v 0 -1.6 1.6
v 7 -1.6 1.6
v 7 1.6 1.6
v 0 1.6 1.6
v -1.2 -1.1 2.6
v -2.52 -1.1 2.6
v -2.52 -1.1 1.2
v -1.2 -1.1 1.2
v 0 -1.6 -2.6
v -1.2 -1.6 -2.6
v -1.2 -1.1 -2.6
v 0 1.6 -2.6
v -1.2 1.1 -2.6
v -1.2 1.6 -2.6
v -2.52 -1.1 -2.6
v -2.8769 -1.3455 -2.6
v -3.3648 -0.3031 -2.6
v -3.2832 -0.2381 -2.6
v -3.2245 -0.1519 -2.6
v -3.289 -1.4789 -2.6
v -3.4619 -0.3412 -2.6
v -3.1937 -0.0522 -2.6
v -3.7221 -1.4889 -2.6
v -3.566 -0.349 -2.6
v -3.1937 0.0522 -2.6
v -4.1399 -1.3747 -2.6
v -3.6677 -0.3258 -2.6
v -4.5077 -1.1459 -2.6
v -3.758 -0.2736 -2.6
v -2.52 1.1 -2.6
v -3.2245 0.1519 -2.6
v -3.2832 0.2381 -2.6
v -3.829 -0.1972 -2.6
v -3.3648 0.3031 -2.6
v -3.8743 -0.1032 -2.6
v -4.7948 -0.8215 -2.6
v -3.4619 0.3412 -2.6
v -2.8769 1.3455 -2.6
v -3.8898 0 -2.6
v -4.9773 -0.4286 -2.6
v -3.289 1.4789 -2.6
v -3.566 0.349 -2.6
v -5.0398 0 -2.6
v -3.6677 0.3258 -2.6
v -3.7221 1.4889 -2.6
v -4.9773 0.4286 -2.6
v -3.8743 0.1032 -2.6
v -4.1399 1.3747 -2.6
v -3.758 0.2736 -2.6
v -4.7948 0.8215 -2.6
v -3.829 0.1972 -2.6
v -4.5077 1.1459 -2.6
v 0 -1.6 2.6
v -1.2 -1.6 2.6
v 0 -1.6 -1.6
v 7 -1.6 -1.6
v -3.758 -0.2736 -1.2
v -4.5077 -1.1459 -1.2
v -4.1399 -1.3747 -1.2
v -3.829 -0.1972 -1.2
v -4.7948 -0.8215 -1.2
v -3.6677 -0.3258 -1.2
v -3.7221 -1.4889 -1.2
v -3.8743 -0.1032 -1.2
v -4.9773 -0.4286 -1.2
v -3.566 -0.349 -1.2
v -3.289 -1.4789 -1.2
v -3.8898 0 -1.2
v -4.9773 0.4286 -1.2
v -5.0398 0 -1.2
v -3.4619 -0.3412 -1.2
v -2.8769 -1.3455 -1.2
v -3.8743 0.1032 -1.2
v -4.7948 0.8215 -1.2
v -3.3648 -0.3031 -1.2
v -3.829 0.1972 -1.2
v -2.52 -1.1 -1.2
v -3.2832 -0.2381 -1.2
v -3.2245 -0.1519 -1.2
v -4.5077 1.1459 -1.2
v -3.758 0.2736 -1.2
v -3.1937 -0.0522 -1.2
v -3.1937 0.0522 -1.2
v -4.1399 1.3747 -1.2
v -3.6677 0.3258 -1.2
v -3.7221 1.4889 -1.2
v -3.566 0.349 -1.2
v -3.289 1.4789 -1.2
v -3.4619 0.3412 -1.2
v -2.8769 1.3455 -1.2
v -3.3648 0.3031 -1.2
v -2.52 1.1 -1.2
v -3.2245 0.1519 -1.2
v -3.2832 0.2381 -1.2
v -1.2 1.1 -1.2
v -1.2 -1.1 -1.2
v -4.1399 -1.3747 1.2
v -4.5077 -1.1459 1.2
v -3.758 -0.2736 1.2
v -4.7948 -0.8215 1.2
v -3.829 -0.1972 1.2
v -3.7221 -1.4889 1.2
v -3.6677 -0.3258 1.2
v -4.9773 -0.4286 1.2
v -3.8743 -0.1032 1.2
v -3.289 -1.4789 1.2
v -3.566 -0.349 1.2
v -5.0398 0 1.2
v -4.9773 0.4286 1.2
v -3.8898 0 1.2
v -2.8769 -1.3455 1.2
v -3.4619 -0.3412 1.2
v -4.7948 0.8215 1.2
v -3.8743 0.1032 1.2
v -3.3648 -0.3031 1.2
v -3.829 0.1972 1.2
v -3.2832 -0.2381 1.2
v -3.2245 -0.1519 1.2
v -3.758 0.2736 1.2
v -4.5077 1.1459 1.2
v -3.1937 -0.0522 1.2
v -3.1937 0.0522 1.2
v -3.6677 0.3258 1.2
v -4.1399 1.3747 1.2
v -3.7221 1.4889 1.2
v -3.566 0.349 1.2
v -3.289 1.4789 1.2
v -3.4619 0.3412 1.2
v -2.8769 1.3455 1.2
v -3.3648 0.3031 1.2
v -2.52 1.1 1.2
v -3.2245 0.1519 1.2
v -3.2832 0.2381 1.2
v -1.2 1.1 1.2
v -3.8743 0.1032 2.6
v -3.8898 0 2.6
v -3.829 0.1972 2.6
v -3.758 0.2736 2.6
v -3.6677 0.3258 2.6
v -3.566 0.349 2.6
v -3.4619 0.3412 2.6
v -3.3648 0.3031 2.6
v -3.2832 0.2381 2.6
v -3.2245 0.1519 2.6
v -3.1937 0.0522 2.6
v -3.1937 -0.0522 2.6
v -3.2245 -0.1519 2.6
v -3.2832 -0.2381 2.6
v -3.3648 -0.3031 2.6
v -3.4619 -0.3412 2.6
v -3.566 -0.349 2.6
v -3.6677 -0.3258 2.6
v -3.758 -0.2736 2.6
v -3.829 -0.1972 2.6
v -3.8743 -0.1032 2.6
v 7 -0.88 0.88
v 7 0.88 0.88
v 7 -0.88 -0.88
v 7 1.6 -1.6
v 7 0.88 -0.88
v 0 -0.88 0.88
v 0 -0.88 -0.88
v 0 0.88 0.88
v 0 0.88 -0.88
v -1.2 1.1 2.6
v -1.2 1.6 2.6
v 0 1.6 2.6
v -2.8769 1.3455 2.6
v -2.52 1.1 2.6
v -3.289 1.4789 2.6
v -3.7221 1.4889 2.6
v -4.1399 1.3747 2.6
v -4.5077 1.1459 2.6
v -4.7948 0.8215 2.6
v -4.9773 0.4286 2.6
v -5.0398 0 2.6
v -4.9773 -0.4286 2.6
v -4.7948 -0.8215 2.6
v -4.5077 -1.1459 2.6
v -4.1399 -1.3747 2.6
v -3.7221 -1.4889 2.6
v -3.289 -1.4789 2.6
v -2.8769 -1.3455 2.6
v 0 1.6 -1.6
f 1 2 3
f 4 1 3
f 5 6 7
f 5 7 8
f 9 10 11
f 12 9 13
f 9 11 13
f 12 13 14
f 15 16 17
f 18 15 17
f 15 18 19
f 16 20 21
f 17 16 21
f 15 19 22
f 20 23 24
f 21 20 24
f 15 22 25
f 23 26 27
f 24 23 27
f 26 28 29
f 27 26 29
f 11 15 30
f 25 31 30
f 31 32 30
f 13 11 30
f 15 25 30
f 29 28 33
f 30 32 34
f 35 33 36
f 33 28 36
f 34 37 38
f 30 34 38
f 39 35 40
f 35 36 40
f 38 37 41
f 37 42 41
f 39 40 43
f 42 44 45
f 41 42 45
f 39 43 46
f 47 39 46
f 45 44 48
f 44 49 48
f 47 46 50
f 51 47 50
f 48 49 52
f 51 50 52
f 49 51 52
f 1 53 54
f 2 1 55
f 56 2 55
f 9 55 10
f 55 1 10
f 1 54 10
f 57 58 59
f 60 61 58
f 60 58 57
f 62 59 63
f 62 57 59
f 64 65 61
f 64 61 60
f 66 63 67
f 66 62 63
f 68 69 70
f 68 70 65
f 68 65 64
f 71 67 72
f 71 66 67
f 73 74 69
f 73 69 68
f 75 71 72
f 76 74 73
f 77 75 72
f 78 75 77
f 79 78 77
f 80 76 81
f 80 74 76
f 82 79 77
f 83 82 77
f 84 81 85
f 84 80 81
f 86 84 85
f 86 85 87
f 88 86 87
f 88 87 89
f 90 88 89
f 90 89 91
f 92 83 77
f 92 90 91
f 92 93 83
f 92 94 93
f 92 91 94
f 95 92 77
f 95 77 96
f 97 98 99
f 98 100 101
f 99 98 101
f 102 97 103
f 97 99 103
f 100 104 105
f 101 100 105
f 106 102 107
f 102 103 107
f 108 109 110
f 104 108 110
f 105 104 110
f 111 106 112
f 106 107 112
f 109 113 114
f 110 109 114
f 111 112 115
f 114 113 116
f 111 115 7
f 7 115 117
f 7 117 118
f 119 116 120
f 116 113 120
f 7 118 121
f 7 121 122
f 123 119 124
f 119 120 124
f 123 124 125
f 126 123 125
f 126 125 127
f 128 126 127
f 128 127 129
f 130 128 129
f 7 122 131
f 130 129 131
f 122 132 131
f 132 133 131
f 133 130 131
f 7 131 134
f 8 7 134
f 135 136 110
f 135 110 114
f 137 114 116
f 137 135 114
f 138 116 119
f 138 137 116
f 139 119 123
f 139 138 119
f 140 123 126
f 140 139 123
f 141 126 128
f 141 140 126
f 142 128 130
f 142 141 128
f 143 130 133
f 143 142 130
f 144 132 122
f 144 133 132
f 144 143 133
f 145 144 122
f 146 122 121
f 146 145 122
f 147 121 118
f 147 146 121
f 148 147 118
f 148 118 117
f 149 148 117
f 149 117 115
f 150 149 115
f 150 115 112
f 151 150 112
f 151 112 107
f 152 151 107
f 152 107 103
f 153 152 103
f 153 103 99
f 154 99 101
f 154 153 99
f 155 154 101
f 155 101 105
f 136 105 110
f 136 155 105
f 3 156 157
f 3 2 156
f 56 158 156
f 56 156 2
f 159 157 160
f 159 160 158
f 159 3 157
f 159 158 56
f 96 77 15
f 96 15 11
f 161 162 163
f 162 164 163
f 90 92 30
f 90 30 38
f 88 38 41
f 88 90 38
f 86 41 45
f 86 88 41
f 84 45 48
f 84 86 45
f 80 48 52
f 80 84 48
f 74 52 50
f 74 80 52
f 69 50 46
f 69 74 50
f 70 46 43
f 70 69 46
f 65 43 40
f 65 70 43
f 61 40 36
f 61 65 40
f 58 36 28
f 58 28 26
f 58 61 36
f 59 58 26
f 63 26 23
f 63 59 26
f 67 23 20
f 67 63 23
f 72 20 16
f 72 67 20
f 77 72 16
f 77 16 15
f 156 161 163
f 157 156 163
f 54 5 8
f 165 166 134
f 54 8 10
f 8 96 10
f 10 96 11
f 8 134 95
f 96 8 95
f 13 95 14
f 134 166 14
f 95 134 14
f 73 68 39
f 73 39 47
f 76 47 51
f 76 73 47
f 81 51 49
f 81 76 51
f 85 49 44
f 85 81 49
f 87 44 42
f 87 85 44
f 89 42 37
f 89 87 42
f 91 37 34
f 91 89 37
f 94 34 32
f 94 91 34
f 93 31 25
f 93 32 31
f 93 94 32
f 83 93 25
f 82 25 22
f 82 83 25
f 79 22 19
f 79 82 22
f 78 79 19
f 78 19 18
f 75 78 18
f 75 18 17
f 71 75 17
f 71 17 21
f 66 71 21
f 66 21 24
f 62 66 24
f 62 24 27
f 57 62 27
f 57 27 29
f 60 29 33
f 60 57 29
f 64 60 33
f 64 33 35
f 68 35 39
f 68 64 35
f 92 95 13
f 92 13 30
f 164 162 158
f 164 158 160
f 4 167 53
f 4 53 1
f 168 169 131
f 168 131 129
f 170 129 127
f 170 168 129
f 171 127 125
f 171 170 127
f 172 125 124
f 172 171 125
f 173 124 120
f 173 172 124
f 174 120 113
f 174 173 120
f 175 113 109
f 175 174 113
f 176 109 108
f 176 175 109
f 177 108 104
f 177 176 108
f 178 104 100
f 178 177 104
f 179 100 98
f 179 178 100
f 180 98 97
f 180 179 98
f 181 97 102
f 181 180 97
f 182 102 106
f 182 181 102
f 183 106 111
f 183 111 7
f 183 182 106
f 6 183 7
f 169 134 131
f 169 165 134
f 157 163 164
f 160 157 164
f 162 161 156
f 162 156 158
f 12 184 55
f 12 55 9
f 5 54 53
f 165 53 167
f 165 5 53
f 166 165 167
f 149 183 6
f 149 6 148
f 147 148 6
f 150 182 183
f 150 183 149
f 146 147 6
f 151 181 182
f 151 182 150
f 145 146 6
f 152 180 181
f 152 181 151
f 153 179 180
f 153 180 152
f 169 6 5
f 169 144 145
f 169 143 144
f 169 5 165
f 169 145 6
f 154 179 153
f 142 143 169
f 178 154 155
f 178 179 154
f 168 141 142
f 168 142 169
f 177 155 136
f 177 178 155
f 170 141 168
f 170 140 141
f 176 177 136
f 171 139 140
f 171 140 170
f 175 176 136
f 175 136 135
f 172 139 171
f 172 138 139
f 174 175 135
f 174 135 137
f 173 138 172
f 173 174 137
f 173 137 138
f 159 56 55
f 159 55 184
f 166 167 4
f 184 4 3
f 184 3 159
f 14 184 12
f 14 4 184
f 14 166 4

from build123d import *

# Parameters (mm, degrees)
SKETCH_1_W               = 3.2
SKETCH_1_H               = 3.2
SKETCH_1_W_2             = 1.76
SKETCH_1_H_2             = 1.76
EXTRUDE_1_DEPTH          = 7
SKETCH_2_W               = 3.2
SKETCH_2_H               = 3.2
EXTRUDE_2_DEPTH          = 1.2
EXTRUDE_3_DEPTH          = 2.6
CUT_EXTRUDE_1_DEPTH      = 1.2
SKETCH_5_W               = 5.2
SKETCH_5_H               = 3.2
EXTRUDE_4_DEPTH          = 1.2
CUT_EXTRUDE_2_DEPTH      = 9.124038405
CUT_EXTRUDE_2_DEPTH_BACK = 9.124038405
SKETCH_6_R               = 0.35


with BuildPart() as part:
    # 草图1 → 凸台-拉伸1 (new body)
    with BuildSketch(Plane(origin=(0, 0, 0), x_dir=(0, 0, -1), z_dir=(1, 0, 0))):
        Rectangle(SKETCH_1_W, SKETCH_1_H)
        Rectangle(SKETCH_1_W_2, SKETCH_1_H_2, mode=Mode.SUBTRACT)
    extrude(amount=EXTRUDE_1_DEPTH)

    # 草图2 → 凸台-拉伸2 (add)
    with BuildSketch(Plane.ZY):
        Rectangle(SKETCH_2_W, SKETCH_2_H)
    extrude(amount=EXTRUDE_2_DEPTH)

    # 草图3 → 凸台-拉伸3 (add, symmetric)
    with BuildSketch(Plane.XY):
        with BuildLine():
            Line((-1.2, -1.1), (-1.2, 1.1))
            Line((-1.2, 1.1), (-2.52, 1.1))
            ThreePointArc((-2.52, 1.1), (-2.165084685, 0.600122548), (-2.039803903, 0))
            ThreePointArc((-2.039803903, 0), (-2.165084685, -0.600122548), (-2.52, -1.1))
            Line((-2.52, -1.1), (-1.2, -1.1))
        make_face()
        with BuildLine():
            ThreePointArc((-2.039803903, 0), (-2.165084685, 0.600122548), (-2.52, 1.1))
            Line((-2.52, 1.1), (-2.52, -1.1))
            ThreePointArc((-2.52, -1.1), (-2.165084685, -0.600122548), (-2.039803903, 0))
        make_face()
        with BuildLine():
            Line((-2.52, -1.1), (-2.52, 1.1))
            ThreePointArc((-2.52, 1.1), (-5.039803903, 0), (-2.52, -1.1))
        make_face()
        with BuildLine():
            ThreePointArc((-2.039803903, 0), (-2.165084685, 0.600122548), (-2.52, 1.1))
            Line((-2.52, 1.1), (-2.52, -1.1))
            ThreePointArc((-2.52, -1.1), (-2.165084685, -0.600122548), (-2.039803903, 0))
        make_face()
        with BuildLine():
            Line((-2.52, -1.1), (-2.52, 1.1))
            ThreePointArc((-2.52, 1.1), (-5.039803903, 0), (-2.52, -1.1))
        make_face()
    extrude(amount=EXTRUDE_3_DEPTH, both=True)

    # 草图4 → 切除-拉伸1 (cut, symmetric)
    with BuildSketch(Plane.XY):
        with BuildLine():
            Line((-1.2, 1.1), (-2.52, 1.1))
            ThreePointArc((-2.52, 1.1), (-5.039803903, 0), (-2.52, -1.1))
            Line((-2.52, -1.1), (-1.2, -1.1))
            Line((-1.2, -1.1), (-1.2, 1.1))
        make_face()
    extrude(amount=CUT_EXTRUDE_1_DEPTH, both=True, mode=Mode.SUBTRACT)

    # 草图5 → 凸台-拉伸4 (add)
    with BuildSketch(Plane(origin=(-1.2, 0, 0), x_dir=(0, 0, -1), z_dir=(1, 0, 0))):
        Rectangle(SKETCH_5_W, SKETCH_5_H)
    extrude(amount=EXTRUDE_4_DEPTH)

    # 草图6 → 切除-拉伸2 (cut, two sides: drawn at the far end of the back side and taken through both)
    with BuildSketch(Plane(origin=(0, 0, 1.2), x_dir=(-1, 0, 0), z_dir=(0, 0, -1)).offset(-CUT_EXTRUDE_2_DEPTH_BACK)):
        with Locations((3.539803903, 0)):
            Circle(SKETCH_6_R)
    extrude(amount=CUT_EXTRUDE_2_DEPTH + CUT_EXTRUDE_2_DEPTH_BACK, mode=Mode.SUBTRACT)


solid = part.part
